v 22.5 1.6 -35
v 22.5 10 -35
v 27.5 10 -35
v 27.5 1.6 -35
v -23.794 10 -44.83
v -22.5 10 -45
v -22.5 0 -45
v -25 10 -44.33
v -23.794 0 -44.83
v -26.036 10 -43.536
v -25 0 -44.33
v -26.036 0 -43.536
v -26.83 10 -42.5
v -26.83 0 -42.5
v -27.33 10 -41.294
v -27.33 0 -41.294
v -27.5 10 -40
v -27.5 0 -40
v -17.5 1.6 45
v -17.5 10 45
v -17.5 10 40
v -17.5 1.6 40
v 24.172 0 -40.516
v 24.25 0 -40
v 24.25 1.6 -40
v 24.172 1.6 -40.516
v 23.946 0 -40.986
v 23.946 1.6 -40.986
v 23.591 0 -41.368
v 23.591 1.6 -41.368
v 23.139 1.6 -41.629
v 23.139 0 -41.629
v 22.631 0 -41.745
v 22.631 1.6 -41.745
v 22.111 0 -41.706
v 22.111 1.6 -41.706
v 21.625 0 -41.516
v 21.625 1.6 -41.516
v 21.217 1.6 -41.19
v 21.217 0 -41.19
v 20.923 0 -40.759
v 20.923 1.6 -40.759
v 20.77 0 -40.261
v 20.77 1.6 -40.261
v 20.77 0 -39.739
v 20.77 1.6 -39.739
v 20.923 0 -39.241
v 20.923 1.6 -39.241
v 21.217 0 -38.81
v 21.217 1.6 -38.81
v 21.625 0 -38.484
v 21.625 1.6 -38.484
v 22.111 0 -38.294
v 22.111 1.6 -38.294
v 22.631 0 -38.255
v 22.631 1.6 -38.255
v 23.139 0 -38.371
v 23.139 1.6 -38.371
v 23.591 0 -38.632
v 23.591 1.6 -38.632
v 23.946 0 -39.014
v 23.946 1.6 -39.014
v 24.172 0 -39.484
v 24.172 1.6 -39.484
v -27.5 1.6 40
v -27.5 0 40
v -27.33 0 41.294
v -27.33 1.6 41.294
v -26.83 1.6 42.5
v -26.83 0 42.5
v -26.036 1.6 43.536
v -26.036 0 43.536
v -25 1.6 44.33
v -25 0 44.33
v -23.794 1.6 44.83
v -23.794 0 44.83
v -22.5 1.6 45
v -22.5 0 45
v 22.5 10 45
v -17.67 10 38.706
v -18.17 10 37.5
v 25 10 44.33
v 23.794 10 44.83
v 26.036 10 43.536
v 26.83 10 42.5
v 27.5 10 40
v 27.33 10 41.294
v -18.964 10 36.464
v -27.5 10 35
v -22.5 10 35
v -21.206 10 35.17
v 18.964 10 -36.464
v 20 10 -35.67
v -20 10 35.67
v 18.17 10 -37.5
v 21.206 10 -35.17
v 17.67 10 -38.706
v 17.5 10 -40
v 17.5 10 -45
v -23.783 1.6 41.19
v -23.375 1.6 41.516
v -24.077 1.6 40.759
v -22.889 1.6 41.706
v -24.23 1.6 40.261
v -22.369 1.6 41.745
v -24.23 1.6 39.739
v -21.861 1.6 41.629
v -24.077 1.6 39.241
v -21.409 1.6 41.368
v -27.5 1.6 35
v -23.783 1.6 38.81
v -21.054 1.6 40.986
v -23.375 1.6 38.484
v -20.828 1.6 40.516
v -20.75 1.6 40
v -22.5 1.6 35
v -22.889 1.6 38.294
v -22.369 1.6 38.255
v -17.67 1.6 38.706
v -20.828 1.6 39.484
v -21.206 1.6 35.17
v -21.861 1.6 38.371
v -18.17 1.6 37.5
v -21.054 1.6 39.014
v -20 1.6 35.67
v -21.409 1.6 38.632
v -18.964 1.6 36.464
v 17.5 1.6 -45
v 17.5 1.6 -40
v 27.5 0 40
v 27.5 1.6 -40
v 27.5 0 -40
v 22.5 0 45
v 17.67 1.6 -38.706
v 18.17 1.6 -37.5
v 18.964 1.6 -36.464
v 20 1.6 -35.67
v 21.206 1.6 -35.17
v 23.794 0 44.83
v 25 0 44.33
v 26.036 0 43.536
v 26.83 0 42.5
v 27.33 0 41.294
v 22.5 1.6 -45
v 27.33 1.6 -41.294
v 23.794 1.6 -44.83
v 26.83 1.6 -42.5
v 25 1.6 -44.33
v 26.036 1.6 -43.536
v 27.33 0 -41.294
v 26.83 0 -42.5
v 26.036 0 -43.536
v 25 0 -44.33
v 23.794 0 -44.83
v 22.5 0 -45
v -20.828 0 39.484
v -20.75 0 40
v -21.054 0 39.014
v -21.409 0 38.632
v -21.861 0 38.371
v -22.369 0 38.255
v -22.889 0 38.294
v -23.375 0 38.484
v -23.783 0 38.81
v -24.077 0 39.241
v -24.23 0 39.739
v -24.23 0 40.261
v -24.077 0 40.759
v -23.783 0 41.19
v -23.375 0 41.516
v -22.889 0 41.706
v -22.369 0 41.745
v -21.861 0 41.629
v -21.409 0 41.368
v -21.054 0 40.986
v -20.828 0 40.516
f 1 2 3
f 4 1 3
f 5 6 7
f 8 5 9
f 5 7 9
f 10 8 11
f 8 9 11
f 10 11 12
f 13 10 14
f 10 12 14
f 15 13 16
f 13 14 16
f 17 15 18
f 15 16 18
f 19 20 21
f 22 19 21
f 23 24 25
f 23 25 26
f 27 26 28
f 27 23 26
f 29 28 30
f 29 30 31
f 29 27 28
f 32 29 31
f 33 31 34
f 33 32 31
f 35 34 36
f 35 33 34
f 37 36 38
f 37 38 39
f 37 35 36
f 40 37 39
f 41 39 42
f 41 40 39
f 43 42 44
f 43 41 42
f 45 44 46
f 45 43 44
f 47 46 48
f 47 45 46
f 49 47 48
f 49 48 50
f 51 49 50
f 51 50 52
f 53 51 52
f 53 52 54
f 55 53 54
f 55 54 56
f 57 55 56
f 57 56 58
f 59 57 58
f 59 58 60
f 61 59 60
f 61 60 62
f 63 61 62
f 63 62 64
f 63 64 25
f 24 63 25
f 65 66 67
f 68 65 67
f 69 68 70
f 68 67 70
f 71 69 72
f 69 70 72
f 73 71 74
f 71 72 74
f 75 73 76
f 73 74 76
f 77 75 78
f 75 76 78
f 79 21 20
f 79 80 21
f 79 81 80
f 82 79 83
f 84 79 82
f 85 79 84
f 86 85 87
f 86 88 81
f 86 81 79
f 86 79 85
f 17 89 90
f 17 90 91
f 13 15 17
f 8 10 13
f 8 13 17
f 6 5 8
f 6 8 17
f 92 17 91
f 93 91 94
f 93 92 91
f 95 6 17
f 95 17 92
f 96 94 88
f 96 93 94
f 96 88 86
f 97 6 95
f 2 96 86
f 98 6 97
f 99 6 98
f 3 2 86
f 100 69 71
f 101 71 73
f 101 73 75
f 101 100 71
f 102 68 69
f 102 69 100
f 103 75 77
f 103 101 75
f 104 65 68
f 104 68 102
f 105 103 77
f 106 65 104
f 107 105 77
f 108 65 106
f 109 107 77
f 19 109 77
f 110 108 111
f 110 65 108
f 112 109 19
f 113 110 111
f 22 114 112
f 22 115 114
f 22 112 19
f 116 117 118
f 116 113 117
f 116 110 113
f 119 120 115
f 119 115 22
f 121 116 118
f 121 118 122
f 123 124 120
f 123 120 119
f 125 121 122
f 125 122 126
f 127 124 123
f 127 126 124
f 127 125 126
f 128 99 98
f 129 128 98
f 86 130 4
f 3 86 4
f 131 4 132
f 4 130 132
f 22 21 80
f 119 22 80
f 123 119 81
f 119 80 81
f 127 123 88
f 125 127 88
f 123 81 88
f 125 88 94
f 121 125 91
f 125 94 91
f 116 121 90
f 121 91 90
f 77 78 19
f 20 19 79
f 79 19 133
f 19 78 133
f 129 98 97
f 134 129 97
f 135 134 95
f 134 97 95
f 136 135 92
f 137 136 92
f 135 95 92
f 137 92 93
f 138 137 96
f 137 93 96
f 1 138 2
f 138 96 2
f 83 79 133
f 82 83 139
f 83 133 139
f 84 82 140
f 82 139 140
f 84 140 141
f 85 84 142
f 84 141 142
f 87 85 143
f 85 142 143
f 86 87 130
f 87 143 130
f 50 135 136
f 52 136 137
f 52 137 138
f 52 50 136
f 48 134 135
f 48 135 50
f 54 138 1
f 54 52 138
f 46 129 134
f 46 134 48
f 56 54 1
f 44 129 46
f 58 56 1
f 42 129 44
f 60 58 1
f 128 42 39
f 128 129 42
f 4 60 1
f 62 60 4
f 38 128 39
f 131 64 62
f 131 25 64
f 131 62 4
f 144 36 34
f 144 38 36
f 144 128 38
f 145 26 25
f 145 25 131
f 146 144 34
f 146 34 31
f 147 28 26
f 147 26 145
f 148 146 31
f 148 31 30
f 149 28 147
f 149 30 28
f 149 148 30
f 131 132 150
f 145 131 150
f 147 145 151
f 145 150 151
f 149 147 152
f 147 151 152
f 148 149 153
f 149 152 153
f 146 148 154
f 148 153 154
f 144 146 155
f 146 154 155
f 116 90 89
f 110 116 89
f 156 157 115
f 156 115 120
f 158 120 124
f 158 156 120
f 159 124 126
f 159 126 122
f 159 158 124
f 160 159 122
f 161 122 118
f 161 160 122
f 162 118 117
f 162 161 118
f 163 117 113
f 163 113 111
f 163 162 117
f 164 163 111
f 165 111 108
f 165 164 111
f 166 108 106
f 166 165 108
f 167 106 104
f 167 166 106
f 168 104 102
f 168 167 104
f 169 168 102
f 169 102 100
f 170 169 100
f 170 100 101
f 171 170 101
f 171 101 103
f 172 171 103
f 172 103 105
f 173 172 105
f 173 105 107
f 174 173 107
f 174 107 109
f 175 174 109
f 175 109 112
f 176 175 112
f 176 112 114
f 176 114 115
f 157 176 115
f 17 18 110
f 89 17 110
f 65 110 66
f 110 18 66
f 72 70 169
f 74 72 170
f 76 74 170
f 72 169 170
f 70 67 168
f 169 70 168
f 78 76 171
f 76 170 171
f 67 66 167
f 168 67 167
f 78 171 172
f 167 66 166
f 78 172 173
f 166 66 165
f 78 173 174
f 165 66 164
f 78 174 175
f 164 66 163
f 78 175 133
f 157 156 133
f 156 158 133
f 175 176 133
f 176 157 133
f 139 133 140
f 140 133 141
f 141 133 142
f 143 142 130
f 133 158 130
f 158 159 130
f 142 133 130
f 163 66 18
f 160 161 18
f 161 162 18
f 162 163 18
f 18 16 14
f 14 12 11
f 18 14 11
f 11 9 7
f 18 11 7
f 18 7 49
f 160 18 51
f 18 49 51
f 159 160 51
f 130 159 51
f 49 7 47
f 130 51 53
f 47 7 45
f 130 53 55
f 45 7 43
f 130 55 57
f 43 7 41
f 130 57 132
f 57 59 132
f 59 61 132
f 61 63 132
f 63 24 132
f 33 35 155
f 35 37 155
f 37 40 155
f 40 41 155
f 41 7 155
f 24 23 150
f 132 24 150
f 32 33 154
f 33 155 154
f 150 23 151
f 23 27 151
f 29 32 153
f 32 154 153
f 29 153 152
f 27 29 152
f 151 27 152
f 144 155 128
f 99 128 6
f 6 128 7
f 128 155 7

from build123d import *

# Parameters (mm, degrees)
SKETCH_1_R          = 1.75
EXTRUDE_1_DEPTH     = 10
SKETCH_2_R          = 1.75
CUT_EXTRUDE_2_DEPTH = 8.4


with BuildPart() as part:
    # 草图1 → 凸台-拉伸1 (new body)
    with BuildSketch(Plane(origin=(0, 0, 0), x_dir=(1, 0, 0), z_dir=(0, 1, 0))):
        with BuildLine():
            Line((-22.5, -45), (22.5, -45))
            ThreePointArc((22.5, -45), (26.035533906, -43.535533906), (27.5, -40))
            Line((27.5, -40), (27.5, 40))
            ThreePointArc((27.5, 40), (26.035533906, 43.535533906), (22.5, 45))
            Line((22.5, 45), (-22.5, 45))
            ThreePointArc((-22.5, 45), (-26.035533906, 43.535533906), (-27.5, 40))
            Line((-27.5, 40), (-27.5, -40))
            ThreePointArc((-27.5, -40), (-26.035533906, -43.535533906), (-22.5, -45))
        make_face()
        with Locations((-22.5, -40)):
            Circle(SKETCH_1_R, mode=Mode.SUBTRACT)
        with Locations((22.5, 40)):
            Circle(SKETCH_1_R, mode=Mode.SUBTRACT)
    extrude(amount=EXTRUDE_1_DEPTH)

    # 草图2 → 切除-拉伸2 (cut)
    with BuildSketch(Plane(origin=(0, 10, 0), x_dir=(1, 0, 0), z_dir=(0, 1, 0))):
        with BuildLine():
            Line((-27.5, -35), (-27.5, -40))
            ThreePointArc((-27.5, -40), (-26.035533906, -43.535533906), (-22.5, -45))
            Line((-22.5, -45), (-17.5, -45))
            Line((-17.5, -45), (-17.5, -40))
            ThreePointArc((-17.5, -40), (-18.964466094, -36.464466094), (-22.5, -35))
            Line((-22.5, -35), (-27.5, -35))
        make_face()
        with Locations((-22.5, -40)):
            Circle(SKETCH_2_R, mode=Mode.SUBTRACT)
        with BuildLine():
            Line((22.5, 45), (17.5, 45))
            Line((17.5, 45), (17.5, 40))
            ThreePointArc((17.5, 40), (18.964466094, 36.464466094), (22.5, 35))
            Line((22.5, 35), (27.5, 35))
            Line((27.5, 35), (27.5, 40))
            ThreePointArc((27.5, 40), (26.035533906, 43.535533906), (22.5, 45))
        make_face()
        with Locations((22.5, 40)):
            Circle(SKETCH_2_R, mode=Mode.SUBTRACT)
    extrude(amount=-CUT_EXTRUDE_2_DEPTH, mode=Mode.SUBTRACT)


solid = part.part
